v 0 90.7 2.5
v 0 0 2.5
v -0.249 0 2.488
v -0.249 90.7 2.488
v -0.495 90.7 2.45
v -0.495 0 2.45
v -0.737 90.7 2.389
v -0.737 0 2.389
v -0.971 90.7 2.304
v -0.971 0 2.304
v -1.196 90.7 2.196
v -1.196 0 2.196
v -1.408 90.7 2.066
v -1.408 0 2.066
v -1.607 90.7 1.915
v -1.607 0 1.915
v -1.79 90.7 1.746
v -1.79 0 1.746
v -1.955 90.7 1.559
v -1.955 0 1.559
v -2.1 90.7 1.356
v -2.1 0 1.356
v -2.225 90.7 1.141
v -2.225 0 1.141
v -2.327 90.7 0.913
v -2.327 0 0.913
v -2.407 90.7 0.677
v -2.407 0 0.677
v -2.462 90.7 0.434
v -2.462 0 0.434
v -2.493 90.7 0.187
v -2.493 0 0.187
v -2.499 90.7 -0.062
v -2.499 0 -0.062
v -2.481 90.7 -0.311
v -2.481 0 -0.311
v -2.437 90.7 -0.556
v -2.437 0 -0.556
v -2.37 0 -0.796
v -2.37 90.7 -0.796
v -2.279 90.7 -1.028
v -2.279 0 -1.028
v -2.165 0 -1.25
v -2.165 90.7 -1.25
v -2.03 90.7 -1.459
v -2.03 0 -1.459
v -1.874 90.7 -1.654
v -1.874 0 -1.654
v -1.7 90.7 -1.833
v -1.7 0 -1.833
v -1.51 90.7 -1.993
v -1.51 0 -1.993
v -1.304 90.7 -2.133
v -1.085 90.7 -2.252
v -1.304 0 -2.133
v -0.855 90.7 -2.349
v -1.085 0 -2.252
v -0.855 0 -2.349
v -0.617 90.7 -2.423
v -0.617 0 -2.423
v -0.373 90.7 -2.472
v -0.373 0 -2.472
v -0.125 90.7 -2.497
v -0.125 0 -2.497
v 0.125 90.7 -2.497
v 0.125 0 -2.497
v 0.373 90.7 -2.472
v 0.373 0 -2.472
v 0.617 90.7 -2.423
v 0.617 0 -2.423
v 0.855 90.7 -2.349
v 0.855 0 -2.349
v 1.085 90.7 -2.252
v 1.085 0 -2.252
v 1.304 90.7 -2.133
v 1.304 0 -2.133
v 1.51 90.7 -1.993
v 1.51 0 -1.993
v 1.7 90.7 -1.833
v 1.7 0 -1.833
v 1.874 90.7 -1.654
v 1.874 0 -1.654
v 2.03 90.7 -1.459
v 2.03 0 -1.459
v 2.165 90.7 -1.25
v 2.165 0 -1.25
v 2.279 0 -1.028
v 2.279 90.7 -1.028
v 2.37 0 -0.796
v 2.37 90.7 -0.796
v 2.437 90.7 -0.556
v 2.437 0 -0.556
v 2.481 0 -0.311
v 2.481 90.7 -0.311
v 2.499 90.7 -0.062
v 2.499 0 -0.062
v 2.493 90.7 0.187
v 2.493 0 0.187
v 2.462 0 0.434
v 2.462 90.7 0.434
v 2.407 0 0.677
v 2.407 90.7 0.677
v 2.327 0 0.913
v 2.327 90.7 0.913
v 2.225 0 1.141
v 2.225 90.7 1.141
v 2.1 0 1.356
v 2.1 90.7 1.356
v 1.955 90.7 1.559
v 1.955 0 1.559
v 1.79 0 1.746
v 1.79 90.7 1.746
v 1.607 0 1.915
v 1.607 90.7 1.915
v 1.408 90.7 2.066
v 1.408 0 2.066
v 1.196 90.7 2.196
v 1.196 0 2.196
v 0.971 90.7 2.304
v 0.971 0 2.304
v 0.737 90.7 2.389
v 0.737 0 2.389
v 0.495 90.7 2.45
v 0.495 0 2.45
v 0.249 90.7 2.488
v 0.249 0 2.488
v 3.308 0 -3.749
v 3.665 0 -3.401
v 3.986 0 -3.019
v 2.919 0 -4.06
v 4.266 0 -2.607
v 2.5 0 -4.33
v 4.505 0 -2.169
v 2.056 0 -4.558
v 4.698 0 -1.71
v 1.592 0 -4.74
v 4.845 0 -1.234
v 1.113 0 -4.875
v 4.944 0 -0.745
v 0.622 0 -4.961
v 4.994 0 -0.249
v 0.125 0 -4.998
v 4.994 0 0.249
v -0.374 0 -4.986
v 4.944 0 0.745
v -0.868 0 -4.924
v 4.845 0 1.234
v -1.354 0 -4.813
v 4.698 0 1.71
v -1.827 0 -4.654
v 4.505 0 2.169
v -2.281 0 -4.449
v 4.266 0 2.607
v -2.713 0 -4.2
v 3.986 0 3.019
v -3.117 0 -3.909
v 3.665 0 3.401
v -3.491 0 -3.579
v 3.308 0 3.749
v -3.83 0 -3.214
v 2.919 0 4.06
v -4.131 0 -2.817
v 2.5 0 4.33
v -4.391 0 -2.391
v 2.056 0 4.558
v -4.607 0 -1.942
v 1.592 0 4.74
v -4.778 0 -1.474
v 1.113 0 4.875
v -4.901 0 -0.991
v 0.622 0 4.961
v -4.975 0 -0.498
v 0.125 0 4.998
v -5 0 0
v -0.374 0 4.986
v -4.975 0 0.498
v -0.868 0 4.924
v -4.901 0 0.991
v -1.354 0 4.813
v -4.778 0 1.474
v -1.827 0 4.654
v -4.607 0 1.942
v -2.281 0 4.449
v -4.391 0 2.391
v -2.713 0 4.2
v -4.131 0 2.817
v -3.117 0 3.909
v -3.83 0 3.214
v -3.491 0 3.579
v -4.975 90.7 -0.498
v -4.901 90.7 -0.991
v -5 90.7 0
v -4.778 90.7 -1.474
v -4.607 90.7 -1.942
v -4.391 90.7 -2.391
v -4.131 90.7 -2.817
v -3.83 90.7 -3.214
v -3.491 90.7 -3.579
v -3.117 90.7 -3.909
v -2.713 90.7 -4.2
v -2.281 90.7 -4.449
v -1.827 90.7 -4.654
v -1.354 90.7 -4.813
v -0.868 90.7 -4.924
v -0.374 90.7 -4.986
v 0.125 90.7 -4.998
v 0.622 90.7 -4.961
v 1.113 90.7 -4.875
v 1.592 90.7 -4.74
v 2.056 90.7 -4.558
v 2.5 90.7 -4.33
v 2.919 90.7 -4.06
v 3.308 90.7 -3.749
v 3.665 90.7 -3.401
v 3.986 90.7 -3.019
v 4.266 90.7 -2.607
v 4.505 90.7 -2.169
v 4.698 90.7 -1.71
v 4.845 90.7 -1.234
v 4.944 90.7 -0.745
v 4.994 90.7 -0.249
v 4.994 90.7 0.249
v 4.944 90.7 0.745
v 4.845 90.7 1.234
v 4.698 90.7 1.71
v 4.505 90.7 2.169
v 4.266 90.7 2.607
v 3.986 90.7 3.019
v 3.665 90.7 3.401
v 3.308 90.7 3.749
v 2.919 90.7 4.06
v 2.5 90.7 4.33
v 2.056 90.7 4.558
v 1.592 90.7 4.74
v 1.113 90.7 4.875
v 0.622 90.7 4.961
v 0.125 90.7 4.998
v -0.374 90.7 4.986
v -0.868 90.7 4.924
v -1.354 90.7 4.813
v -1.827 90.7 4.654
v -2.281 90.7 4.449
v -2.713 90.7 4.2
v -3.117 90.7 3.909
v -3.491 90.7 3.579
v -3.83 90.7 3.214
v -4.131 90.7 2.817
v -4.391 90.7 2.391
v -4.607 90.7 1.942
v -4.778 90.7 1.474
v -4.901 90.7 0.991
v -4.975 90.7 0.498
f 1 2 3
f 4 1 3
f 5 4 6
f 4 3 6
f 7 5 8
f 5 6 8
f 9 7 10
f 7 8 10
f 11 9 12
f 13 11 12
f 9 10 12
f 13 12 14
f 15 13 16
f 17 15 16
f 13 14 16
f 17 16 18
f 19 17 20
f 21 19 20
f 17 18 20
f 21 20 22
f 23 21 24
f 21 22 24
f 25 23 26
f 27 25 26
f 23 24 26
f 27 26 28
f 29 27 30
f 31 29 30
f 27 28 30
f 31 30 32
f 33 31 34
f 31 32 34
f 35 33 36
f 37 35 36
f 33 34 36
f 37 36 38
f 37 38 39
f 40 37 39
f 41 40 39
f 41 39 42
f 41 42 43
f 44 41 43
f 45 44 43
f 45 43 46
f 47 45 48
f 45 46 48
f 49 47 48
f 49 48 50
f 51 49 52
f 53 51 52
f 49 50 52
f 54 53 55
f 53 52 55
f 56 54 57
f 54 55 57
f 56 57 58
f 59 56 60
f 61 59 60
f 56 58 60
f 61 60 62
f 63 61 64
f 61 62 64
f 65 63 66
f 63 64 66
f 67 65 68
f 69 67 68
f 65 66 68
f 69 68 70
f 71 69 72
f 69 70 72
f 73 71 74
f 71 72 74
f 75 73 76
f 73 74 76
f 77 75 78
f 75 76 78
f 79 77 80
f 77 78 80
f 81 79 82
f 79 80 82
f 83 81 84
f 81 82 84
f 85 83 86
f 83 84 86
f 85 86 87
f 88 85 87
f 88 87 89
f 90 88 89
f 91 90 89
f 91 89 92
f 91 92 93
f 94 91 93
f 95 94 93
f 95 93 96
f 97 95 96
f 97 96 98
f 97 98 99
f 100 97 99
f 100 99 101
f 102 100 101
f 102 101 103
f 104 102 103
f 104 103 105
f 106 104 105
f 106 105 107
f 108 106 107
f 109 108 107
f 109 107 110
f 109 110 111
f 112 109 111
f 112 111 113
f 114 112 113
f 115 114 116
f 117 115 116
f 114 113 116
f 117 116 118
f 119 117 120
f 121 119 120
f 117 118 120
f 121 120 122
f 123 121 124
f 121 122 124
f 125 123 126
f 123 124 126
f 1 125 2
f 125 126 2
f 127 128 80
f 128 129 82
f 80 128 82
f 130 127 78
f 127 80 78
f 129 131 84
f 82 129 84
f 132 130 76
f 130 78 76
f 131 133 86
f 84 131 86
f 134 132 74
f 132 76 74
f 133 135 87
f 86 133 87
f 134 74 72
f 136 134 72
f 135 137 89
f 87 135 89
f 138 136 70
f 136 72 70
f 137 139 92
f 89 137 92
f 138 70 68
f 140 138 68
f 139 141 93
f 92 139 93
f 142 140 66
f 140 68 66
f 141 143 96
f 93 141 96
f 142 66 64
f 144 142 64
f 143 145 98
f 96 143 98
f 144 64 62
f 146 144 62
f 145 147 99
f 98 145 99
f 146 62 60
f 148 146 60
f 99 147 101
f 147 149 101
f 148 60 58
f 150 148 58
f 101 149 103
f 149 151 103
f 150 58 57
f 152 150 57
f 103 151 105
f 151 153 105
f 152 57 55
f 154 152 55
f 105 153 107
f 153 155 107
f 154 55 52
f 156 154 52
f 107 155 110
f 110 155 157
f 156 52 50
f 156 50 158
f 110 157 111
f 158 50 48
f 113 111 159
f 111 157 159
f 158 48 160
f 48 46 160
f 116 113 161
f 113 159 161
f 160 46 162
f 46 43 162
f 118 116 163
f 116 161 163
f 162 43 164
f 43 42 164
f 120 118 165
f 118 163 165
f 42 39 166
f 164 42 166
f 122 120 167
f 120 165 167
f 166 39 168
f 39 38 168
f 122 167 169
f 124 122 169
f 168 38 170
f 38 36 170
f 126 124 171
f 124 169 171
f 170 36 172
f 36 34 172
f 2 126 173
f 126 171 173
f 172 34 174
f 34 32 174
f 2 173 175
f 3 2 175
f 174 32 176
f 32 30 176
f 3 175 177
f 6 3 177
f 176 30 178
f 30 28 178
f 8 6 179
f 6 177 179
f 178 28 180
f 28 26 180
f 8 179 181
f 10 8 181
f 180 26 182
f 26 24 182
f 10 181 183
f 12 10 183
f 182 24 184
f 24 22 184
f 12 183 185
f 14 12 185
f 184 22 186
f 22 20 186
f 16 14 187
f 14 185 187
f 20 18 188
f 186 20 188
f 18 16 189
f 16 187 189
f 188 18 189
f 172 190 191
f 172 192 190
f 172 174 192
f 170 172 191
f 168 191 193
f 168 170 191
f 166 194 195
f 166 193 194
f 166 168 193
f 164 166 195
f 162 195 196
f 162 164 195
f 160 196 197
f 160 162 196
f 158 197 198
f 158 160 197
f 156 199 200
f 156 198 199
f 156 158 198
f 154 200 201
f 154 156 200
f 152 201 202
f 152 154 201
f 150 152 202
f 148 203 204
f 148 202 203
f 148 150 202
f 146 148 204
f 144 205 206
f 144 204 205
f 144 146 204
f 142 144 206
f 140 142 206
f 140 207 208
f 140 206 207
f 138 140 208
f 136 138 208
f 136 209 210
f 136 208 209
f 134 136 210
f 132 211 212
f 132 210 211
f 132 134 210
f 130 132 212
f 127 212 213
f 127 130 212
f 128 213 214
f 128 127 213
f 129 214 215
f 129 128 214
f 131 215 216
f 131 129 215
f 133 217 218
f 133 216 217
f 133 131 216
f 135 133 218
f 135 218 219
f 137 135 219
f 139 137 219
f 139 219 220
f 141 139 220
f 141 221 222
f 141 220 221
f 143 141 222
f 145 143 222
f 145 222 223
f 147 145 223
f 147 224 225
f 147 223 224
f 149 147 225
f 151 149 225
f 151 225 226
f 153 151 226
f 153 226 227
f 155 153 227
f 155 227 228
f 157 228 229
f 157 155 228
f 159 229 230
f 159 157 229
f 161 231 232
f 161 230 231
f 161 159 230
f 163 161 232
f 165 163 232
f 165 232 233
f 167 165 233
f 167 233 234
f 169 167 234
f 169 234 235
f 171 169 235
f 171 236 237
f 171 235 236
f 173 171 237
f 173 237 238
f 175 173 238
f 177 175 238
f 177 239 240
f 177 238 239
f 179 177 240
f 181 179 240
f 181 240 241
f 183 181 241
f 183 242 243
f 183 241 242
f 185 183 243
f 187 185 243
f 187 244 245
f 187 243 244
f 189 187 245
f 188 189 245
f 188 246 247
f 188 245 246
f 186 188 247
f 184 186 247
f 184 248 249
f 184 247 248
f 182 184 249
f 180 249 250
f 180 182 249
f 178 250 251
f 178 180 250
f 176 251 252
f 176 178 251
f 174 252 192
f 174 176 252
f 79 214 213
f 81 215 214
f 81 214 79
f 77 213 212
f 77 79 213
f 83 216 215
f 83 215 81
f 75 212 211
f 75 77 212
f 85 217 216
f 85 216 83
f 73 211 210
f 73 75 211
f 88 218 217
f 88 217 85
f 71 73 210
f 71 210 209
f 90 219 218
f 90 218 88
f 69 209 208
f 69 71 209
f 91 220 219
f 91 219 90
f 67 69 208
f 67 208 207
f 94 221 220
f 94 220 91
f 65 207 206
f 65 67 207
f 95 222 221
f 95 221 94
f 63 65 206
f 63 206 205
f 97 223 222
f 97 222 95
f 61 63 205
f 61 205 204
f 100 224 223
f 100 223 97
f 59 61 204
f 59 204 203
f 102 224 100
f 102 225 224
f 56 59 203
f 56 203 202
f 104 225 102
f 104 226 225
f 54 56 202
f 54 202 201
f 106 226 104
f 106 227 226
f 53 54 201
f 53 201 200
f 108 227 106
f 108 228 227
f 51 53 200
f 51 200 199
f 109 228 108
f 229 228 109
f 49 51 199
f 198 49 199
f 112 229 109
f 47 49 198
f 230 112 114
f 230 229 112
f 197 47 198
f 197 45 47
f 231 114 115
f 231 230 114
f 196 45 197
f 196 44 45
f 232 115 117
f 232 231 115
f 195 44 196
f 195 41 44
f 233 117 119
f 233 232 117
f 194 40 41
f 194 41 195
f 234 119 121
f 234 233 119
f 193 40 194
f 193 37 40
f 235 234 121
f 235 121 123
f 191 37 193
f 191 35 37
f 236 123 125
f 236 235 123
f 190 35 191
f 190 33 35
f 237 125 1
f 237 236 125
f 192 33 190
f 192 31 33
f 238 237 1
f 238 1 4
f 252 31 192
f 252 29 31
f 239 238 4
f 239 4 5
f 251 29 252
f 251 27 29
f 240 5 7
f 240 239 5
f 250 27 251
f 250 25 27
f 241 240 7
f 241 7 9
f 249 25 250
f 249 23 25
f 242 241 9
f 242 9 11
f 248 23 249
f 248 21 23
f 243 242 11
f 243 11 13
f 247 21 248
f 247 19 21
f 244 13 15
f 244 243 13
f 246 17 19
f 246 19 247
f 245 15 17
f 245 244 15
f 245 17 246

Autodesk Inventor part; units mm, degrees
ref_plane "YZ Plane" through (0, 0, 0) normal (1, 0, 0) x (0, 1, 0)
ref_plane "XZ Plane" through (0, 0, 0) normal (0, 1, 0) x (-1, 0, 0)
ref_plane "XY Plane" through (0, 0, 0) normal (0, 0, 1) x (1, 0, 0)
sketch "Boceto3" plane through (0, 0, 0) normal (0, 1, 0) x (-1, 0, 0)
  circle A0 centre (0, 0) radius 5
  dimension "d10" = 10
extrude "Extrusión2" add sketch "Boceto3" along normal blind 90.7
extrude "Extrusión3" cut sketch "Boceto3" along normal blind 90.7
extrude "Extrusión4" add sketch "Boceto3" along normal blind 90.7
sketch "Boceto4" plane through (0, 90.7, 0) normal (0, 1, 0) x (1, 0, 0)
  point P0 (0, 0)
hole "Agujero2" at (0, 90.7, 0) direction (0, -1, 0) diameter 5 end through all
properties part number "soprye para base bobinas"
